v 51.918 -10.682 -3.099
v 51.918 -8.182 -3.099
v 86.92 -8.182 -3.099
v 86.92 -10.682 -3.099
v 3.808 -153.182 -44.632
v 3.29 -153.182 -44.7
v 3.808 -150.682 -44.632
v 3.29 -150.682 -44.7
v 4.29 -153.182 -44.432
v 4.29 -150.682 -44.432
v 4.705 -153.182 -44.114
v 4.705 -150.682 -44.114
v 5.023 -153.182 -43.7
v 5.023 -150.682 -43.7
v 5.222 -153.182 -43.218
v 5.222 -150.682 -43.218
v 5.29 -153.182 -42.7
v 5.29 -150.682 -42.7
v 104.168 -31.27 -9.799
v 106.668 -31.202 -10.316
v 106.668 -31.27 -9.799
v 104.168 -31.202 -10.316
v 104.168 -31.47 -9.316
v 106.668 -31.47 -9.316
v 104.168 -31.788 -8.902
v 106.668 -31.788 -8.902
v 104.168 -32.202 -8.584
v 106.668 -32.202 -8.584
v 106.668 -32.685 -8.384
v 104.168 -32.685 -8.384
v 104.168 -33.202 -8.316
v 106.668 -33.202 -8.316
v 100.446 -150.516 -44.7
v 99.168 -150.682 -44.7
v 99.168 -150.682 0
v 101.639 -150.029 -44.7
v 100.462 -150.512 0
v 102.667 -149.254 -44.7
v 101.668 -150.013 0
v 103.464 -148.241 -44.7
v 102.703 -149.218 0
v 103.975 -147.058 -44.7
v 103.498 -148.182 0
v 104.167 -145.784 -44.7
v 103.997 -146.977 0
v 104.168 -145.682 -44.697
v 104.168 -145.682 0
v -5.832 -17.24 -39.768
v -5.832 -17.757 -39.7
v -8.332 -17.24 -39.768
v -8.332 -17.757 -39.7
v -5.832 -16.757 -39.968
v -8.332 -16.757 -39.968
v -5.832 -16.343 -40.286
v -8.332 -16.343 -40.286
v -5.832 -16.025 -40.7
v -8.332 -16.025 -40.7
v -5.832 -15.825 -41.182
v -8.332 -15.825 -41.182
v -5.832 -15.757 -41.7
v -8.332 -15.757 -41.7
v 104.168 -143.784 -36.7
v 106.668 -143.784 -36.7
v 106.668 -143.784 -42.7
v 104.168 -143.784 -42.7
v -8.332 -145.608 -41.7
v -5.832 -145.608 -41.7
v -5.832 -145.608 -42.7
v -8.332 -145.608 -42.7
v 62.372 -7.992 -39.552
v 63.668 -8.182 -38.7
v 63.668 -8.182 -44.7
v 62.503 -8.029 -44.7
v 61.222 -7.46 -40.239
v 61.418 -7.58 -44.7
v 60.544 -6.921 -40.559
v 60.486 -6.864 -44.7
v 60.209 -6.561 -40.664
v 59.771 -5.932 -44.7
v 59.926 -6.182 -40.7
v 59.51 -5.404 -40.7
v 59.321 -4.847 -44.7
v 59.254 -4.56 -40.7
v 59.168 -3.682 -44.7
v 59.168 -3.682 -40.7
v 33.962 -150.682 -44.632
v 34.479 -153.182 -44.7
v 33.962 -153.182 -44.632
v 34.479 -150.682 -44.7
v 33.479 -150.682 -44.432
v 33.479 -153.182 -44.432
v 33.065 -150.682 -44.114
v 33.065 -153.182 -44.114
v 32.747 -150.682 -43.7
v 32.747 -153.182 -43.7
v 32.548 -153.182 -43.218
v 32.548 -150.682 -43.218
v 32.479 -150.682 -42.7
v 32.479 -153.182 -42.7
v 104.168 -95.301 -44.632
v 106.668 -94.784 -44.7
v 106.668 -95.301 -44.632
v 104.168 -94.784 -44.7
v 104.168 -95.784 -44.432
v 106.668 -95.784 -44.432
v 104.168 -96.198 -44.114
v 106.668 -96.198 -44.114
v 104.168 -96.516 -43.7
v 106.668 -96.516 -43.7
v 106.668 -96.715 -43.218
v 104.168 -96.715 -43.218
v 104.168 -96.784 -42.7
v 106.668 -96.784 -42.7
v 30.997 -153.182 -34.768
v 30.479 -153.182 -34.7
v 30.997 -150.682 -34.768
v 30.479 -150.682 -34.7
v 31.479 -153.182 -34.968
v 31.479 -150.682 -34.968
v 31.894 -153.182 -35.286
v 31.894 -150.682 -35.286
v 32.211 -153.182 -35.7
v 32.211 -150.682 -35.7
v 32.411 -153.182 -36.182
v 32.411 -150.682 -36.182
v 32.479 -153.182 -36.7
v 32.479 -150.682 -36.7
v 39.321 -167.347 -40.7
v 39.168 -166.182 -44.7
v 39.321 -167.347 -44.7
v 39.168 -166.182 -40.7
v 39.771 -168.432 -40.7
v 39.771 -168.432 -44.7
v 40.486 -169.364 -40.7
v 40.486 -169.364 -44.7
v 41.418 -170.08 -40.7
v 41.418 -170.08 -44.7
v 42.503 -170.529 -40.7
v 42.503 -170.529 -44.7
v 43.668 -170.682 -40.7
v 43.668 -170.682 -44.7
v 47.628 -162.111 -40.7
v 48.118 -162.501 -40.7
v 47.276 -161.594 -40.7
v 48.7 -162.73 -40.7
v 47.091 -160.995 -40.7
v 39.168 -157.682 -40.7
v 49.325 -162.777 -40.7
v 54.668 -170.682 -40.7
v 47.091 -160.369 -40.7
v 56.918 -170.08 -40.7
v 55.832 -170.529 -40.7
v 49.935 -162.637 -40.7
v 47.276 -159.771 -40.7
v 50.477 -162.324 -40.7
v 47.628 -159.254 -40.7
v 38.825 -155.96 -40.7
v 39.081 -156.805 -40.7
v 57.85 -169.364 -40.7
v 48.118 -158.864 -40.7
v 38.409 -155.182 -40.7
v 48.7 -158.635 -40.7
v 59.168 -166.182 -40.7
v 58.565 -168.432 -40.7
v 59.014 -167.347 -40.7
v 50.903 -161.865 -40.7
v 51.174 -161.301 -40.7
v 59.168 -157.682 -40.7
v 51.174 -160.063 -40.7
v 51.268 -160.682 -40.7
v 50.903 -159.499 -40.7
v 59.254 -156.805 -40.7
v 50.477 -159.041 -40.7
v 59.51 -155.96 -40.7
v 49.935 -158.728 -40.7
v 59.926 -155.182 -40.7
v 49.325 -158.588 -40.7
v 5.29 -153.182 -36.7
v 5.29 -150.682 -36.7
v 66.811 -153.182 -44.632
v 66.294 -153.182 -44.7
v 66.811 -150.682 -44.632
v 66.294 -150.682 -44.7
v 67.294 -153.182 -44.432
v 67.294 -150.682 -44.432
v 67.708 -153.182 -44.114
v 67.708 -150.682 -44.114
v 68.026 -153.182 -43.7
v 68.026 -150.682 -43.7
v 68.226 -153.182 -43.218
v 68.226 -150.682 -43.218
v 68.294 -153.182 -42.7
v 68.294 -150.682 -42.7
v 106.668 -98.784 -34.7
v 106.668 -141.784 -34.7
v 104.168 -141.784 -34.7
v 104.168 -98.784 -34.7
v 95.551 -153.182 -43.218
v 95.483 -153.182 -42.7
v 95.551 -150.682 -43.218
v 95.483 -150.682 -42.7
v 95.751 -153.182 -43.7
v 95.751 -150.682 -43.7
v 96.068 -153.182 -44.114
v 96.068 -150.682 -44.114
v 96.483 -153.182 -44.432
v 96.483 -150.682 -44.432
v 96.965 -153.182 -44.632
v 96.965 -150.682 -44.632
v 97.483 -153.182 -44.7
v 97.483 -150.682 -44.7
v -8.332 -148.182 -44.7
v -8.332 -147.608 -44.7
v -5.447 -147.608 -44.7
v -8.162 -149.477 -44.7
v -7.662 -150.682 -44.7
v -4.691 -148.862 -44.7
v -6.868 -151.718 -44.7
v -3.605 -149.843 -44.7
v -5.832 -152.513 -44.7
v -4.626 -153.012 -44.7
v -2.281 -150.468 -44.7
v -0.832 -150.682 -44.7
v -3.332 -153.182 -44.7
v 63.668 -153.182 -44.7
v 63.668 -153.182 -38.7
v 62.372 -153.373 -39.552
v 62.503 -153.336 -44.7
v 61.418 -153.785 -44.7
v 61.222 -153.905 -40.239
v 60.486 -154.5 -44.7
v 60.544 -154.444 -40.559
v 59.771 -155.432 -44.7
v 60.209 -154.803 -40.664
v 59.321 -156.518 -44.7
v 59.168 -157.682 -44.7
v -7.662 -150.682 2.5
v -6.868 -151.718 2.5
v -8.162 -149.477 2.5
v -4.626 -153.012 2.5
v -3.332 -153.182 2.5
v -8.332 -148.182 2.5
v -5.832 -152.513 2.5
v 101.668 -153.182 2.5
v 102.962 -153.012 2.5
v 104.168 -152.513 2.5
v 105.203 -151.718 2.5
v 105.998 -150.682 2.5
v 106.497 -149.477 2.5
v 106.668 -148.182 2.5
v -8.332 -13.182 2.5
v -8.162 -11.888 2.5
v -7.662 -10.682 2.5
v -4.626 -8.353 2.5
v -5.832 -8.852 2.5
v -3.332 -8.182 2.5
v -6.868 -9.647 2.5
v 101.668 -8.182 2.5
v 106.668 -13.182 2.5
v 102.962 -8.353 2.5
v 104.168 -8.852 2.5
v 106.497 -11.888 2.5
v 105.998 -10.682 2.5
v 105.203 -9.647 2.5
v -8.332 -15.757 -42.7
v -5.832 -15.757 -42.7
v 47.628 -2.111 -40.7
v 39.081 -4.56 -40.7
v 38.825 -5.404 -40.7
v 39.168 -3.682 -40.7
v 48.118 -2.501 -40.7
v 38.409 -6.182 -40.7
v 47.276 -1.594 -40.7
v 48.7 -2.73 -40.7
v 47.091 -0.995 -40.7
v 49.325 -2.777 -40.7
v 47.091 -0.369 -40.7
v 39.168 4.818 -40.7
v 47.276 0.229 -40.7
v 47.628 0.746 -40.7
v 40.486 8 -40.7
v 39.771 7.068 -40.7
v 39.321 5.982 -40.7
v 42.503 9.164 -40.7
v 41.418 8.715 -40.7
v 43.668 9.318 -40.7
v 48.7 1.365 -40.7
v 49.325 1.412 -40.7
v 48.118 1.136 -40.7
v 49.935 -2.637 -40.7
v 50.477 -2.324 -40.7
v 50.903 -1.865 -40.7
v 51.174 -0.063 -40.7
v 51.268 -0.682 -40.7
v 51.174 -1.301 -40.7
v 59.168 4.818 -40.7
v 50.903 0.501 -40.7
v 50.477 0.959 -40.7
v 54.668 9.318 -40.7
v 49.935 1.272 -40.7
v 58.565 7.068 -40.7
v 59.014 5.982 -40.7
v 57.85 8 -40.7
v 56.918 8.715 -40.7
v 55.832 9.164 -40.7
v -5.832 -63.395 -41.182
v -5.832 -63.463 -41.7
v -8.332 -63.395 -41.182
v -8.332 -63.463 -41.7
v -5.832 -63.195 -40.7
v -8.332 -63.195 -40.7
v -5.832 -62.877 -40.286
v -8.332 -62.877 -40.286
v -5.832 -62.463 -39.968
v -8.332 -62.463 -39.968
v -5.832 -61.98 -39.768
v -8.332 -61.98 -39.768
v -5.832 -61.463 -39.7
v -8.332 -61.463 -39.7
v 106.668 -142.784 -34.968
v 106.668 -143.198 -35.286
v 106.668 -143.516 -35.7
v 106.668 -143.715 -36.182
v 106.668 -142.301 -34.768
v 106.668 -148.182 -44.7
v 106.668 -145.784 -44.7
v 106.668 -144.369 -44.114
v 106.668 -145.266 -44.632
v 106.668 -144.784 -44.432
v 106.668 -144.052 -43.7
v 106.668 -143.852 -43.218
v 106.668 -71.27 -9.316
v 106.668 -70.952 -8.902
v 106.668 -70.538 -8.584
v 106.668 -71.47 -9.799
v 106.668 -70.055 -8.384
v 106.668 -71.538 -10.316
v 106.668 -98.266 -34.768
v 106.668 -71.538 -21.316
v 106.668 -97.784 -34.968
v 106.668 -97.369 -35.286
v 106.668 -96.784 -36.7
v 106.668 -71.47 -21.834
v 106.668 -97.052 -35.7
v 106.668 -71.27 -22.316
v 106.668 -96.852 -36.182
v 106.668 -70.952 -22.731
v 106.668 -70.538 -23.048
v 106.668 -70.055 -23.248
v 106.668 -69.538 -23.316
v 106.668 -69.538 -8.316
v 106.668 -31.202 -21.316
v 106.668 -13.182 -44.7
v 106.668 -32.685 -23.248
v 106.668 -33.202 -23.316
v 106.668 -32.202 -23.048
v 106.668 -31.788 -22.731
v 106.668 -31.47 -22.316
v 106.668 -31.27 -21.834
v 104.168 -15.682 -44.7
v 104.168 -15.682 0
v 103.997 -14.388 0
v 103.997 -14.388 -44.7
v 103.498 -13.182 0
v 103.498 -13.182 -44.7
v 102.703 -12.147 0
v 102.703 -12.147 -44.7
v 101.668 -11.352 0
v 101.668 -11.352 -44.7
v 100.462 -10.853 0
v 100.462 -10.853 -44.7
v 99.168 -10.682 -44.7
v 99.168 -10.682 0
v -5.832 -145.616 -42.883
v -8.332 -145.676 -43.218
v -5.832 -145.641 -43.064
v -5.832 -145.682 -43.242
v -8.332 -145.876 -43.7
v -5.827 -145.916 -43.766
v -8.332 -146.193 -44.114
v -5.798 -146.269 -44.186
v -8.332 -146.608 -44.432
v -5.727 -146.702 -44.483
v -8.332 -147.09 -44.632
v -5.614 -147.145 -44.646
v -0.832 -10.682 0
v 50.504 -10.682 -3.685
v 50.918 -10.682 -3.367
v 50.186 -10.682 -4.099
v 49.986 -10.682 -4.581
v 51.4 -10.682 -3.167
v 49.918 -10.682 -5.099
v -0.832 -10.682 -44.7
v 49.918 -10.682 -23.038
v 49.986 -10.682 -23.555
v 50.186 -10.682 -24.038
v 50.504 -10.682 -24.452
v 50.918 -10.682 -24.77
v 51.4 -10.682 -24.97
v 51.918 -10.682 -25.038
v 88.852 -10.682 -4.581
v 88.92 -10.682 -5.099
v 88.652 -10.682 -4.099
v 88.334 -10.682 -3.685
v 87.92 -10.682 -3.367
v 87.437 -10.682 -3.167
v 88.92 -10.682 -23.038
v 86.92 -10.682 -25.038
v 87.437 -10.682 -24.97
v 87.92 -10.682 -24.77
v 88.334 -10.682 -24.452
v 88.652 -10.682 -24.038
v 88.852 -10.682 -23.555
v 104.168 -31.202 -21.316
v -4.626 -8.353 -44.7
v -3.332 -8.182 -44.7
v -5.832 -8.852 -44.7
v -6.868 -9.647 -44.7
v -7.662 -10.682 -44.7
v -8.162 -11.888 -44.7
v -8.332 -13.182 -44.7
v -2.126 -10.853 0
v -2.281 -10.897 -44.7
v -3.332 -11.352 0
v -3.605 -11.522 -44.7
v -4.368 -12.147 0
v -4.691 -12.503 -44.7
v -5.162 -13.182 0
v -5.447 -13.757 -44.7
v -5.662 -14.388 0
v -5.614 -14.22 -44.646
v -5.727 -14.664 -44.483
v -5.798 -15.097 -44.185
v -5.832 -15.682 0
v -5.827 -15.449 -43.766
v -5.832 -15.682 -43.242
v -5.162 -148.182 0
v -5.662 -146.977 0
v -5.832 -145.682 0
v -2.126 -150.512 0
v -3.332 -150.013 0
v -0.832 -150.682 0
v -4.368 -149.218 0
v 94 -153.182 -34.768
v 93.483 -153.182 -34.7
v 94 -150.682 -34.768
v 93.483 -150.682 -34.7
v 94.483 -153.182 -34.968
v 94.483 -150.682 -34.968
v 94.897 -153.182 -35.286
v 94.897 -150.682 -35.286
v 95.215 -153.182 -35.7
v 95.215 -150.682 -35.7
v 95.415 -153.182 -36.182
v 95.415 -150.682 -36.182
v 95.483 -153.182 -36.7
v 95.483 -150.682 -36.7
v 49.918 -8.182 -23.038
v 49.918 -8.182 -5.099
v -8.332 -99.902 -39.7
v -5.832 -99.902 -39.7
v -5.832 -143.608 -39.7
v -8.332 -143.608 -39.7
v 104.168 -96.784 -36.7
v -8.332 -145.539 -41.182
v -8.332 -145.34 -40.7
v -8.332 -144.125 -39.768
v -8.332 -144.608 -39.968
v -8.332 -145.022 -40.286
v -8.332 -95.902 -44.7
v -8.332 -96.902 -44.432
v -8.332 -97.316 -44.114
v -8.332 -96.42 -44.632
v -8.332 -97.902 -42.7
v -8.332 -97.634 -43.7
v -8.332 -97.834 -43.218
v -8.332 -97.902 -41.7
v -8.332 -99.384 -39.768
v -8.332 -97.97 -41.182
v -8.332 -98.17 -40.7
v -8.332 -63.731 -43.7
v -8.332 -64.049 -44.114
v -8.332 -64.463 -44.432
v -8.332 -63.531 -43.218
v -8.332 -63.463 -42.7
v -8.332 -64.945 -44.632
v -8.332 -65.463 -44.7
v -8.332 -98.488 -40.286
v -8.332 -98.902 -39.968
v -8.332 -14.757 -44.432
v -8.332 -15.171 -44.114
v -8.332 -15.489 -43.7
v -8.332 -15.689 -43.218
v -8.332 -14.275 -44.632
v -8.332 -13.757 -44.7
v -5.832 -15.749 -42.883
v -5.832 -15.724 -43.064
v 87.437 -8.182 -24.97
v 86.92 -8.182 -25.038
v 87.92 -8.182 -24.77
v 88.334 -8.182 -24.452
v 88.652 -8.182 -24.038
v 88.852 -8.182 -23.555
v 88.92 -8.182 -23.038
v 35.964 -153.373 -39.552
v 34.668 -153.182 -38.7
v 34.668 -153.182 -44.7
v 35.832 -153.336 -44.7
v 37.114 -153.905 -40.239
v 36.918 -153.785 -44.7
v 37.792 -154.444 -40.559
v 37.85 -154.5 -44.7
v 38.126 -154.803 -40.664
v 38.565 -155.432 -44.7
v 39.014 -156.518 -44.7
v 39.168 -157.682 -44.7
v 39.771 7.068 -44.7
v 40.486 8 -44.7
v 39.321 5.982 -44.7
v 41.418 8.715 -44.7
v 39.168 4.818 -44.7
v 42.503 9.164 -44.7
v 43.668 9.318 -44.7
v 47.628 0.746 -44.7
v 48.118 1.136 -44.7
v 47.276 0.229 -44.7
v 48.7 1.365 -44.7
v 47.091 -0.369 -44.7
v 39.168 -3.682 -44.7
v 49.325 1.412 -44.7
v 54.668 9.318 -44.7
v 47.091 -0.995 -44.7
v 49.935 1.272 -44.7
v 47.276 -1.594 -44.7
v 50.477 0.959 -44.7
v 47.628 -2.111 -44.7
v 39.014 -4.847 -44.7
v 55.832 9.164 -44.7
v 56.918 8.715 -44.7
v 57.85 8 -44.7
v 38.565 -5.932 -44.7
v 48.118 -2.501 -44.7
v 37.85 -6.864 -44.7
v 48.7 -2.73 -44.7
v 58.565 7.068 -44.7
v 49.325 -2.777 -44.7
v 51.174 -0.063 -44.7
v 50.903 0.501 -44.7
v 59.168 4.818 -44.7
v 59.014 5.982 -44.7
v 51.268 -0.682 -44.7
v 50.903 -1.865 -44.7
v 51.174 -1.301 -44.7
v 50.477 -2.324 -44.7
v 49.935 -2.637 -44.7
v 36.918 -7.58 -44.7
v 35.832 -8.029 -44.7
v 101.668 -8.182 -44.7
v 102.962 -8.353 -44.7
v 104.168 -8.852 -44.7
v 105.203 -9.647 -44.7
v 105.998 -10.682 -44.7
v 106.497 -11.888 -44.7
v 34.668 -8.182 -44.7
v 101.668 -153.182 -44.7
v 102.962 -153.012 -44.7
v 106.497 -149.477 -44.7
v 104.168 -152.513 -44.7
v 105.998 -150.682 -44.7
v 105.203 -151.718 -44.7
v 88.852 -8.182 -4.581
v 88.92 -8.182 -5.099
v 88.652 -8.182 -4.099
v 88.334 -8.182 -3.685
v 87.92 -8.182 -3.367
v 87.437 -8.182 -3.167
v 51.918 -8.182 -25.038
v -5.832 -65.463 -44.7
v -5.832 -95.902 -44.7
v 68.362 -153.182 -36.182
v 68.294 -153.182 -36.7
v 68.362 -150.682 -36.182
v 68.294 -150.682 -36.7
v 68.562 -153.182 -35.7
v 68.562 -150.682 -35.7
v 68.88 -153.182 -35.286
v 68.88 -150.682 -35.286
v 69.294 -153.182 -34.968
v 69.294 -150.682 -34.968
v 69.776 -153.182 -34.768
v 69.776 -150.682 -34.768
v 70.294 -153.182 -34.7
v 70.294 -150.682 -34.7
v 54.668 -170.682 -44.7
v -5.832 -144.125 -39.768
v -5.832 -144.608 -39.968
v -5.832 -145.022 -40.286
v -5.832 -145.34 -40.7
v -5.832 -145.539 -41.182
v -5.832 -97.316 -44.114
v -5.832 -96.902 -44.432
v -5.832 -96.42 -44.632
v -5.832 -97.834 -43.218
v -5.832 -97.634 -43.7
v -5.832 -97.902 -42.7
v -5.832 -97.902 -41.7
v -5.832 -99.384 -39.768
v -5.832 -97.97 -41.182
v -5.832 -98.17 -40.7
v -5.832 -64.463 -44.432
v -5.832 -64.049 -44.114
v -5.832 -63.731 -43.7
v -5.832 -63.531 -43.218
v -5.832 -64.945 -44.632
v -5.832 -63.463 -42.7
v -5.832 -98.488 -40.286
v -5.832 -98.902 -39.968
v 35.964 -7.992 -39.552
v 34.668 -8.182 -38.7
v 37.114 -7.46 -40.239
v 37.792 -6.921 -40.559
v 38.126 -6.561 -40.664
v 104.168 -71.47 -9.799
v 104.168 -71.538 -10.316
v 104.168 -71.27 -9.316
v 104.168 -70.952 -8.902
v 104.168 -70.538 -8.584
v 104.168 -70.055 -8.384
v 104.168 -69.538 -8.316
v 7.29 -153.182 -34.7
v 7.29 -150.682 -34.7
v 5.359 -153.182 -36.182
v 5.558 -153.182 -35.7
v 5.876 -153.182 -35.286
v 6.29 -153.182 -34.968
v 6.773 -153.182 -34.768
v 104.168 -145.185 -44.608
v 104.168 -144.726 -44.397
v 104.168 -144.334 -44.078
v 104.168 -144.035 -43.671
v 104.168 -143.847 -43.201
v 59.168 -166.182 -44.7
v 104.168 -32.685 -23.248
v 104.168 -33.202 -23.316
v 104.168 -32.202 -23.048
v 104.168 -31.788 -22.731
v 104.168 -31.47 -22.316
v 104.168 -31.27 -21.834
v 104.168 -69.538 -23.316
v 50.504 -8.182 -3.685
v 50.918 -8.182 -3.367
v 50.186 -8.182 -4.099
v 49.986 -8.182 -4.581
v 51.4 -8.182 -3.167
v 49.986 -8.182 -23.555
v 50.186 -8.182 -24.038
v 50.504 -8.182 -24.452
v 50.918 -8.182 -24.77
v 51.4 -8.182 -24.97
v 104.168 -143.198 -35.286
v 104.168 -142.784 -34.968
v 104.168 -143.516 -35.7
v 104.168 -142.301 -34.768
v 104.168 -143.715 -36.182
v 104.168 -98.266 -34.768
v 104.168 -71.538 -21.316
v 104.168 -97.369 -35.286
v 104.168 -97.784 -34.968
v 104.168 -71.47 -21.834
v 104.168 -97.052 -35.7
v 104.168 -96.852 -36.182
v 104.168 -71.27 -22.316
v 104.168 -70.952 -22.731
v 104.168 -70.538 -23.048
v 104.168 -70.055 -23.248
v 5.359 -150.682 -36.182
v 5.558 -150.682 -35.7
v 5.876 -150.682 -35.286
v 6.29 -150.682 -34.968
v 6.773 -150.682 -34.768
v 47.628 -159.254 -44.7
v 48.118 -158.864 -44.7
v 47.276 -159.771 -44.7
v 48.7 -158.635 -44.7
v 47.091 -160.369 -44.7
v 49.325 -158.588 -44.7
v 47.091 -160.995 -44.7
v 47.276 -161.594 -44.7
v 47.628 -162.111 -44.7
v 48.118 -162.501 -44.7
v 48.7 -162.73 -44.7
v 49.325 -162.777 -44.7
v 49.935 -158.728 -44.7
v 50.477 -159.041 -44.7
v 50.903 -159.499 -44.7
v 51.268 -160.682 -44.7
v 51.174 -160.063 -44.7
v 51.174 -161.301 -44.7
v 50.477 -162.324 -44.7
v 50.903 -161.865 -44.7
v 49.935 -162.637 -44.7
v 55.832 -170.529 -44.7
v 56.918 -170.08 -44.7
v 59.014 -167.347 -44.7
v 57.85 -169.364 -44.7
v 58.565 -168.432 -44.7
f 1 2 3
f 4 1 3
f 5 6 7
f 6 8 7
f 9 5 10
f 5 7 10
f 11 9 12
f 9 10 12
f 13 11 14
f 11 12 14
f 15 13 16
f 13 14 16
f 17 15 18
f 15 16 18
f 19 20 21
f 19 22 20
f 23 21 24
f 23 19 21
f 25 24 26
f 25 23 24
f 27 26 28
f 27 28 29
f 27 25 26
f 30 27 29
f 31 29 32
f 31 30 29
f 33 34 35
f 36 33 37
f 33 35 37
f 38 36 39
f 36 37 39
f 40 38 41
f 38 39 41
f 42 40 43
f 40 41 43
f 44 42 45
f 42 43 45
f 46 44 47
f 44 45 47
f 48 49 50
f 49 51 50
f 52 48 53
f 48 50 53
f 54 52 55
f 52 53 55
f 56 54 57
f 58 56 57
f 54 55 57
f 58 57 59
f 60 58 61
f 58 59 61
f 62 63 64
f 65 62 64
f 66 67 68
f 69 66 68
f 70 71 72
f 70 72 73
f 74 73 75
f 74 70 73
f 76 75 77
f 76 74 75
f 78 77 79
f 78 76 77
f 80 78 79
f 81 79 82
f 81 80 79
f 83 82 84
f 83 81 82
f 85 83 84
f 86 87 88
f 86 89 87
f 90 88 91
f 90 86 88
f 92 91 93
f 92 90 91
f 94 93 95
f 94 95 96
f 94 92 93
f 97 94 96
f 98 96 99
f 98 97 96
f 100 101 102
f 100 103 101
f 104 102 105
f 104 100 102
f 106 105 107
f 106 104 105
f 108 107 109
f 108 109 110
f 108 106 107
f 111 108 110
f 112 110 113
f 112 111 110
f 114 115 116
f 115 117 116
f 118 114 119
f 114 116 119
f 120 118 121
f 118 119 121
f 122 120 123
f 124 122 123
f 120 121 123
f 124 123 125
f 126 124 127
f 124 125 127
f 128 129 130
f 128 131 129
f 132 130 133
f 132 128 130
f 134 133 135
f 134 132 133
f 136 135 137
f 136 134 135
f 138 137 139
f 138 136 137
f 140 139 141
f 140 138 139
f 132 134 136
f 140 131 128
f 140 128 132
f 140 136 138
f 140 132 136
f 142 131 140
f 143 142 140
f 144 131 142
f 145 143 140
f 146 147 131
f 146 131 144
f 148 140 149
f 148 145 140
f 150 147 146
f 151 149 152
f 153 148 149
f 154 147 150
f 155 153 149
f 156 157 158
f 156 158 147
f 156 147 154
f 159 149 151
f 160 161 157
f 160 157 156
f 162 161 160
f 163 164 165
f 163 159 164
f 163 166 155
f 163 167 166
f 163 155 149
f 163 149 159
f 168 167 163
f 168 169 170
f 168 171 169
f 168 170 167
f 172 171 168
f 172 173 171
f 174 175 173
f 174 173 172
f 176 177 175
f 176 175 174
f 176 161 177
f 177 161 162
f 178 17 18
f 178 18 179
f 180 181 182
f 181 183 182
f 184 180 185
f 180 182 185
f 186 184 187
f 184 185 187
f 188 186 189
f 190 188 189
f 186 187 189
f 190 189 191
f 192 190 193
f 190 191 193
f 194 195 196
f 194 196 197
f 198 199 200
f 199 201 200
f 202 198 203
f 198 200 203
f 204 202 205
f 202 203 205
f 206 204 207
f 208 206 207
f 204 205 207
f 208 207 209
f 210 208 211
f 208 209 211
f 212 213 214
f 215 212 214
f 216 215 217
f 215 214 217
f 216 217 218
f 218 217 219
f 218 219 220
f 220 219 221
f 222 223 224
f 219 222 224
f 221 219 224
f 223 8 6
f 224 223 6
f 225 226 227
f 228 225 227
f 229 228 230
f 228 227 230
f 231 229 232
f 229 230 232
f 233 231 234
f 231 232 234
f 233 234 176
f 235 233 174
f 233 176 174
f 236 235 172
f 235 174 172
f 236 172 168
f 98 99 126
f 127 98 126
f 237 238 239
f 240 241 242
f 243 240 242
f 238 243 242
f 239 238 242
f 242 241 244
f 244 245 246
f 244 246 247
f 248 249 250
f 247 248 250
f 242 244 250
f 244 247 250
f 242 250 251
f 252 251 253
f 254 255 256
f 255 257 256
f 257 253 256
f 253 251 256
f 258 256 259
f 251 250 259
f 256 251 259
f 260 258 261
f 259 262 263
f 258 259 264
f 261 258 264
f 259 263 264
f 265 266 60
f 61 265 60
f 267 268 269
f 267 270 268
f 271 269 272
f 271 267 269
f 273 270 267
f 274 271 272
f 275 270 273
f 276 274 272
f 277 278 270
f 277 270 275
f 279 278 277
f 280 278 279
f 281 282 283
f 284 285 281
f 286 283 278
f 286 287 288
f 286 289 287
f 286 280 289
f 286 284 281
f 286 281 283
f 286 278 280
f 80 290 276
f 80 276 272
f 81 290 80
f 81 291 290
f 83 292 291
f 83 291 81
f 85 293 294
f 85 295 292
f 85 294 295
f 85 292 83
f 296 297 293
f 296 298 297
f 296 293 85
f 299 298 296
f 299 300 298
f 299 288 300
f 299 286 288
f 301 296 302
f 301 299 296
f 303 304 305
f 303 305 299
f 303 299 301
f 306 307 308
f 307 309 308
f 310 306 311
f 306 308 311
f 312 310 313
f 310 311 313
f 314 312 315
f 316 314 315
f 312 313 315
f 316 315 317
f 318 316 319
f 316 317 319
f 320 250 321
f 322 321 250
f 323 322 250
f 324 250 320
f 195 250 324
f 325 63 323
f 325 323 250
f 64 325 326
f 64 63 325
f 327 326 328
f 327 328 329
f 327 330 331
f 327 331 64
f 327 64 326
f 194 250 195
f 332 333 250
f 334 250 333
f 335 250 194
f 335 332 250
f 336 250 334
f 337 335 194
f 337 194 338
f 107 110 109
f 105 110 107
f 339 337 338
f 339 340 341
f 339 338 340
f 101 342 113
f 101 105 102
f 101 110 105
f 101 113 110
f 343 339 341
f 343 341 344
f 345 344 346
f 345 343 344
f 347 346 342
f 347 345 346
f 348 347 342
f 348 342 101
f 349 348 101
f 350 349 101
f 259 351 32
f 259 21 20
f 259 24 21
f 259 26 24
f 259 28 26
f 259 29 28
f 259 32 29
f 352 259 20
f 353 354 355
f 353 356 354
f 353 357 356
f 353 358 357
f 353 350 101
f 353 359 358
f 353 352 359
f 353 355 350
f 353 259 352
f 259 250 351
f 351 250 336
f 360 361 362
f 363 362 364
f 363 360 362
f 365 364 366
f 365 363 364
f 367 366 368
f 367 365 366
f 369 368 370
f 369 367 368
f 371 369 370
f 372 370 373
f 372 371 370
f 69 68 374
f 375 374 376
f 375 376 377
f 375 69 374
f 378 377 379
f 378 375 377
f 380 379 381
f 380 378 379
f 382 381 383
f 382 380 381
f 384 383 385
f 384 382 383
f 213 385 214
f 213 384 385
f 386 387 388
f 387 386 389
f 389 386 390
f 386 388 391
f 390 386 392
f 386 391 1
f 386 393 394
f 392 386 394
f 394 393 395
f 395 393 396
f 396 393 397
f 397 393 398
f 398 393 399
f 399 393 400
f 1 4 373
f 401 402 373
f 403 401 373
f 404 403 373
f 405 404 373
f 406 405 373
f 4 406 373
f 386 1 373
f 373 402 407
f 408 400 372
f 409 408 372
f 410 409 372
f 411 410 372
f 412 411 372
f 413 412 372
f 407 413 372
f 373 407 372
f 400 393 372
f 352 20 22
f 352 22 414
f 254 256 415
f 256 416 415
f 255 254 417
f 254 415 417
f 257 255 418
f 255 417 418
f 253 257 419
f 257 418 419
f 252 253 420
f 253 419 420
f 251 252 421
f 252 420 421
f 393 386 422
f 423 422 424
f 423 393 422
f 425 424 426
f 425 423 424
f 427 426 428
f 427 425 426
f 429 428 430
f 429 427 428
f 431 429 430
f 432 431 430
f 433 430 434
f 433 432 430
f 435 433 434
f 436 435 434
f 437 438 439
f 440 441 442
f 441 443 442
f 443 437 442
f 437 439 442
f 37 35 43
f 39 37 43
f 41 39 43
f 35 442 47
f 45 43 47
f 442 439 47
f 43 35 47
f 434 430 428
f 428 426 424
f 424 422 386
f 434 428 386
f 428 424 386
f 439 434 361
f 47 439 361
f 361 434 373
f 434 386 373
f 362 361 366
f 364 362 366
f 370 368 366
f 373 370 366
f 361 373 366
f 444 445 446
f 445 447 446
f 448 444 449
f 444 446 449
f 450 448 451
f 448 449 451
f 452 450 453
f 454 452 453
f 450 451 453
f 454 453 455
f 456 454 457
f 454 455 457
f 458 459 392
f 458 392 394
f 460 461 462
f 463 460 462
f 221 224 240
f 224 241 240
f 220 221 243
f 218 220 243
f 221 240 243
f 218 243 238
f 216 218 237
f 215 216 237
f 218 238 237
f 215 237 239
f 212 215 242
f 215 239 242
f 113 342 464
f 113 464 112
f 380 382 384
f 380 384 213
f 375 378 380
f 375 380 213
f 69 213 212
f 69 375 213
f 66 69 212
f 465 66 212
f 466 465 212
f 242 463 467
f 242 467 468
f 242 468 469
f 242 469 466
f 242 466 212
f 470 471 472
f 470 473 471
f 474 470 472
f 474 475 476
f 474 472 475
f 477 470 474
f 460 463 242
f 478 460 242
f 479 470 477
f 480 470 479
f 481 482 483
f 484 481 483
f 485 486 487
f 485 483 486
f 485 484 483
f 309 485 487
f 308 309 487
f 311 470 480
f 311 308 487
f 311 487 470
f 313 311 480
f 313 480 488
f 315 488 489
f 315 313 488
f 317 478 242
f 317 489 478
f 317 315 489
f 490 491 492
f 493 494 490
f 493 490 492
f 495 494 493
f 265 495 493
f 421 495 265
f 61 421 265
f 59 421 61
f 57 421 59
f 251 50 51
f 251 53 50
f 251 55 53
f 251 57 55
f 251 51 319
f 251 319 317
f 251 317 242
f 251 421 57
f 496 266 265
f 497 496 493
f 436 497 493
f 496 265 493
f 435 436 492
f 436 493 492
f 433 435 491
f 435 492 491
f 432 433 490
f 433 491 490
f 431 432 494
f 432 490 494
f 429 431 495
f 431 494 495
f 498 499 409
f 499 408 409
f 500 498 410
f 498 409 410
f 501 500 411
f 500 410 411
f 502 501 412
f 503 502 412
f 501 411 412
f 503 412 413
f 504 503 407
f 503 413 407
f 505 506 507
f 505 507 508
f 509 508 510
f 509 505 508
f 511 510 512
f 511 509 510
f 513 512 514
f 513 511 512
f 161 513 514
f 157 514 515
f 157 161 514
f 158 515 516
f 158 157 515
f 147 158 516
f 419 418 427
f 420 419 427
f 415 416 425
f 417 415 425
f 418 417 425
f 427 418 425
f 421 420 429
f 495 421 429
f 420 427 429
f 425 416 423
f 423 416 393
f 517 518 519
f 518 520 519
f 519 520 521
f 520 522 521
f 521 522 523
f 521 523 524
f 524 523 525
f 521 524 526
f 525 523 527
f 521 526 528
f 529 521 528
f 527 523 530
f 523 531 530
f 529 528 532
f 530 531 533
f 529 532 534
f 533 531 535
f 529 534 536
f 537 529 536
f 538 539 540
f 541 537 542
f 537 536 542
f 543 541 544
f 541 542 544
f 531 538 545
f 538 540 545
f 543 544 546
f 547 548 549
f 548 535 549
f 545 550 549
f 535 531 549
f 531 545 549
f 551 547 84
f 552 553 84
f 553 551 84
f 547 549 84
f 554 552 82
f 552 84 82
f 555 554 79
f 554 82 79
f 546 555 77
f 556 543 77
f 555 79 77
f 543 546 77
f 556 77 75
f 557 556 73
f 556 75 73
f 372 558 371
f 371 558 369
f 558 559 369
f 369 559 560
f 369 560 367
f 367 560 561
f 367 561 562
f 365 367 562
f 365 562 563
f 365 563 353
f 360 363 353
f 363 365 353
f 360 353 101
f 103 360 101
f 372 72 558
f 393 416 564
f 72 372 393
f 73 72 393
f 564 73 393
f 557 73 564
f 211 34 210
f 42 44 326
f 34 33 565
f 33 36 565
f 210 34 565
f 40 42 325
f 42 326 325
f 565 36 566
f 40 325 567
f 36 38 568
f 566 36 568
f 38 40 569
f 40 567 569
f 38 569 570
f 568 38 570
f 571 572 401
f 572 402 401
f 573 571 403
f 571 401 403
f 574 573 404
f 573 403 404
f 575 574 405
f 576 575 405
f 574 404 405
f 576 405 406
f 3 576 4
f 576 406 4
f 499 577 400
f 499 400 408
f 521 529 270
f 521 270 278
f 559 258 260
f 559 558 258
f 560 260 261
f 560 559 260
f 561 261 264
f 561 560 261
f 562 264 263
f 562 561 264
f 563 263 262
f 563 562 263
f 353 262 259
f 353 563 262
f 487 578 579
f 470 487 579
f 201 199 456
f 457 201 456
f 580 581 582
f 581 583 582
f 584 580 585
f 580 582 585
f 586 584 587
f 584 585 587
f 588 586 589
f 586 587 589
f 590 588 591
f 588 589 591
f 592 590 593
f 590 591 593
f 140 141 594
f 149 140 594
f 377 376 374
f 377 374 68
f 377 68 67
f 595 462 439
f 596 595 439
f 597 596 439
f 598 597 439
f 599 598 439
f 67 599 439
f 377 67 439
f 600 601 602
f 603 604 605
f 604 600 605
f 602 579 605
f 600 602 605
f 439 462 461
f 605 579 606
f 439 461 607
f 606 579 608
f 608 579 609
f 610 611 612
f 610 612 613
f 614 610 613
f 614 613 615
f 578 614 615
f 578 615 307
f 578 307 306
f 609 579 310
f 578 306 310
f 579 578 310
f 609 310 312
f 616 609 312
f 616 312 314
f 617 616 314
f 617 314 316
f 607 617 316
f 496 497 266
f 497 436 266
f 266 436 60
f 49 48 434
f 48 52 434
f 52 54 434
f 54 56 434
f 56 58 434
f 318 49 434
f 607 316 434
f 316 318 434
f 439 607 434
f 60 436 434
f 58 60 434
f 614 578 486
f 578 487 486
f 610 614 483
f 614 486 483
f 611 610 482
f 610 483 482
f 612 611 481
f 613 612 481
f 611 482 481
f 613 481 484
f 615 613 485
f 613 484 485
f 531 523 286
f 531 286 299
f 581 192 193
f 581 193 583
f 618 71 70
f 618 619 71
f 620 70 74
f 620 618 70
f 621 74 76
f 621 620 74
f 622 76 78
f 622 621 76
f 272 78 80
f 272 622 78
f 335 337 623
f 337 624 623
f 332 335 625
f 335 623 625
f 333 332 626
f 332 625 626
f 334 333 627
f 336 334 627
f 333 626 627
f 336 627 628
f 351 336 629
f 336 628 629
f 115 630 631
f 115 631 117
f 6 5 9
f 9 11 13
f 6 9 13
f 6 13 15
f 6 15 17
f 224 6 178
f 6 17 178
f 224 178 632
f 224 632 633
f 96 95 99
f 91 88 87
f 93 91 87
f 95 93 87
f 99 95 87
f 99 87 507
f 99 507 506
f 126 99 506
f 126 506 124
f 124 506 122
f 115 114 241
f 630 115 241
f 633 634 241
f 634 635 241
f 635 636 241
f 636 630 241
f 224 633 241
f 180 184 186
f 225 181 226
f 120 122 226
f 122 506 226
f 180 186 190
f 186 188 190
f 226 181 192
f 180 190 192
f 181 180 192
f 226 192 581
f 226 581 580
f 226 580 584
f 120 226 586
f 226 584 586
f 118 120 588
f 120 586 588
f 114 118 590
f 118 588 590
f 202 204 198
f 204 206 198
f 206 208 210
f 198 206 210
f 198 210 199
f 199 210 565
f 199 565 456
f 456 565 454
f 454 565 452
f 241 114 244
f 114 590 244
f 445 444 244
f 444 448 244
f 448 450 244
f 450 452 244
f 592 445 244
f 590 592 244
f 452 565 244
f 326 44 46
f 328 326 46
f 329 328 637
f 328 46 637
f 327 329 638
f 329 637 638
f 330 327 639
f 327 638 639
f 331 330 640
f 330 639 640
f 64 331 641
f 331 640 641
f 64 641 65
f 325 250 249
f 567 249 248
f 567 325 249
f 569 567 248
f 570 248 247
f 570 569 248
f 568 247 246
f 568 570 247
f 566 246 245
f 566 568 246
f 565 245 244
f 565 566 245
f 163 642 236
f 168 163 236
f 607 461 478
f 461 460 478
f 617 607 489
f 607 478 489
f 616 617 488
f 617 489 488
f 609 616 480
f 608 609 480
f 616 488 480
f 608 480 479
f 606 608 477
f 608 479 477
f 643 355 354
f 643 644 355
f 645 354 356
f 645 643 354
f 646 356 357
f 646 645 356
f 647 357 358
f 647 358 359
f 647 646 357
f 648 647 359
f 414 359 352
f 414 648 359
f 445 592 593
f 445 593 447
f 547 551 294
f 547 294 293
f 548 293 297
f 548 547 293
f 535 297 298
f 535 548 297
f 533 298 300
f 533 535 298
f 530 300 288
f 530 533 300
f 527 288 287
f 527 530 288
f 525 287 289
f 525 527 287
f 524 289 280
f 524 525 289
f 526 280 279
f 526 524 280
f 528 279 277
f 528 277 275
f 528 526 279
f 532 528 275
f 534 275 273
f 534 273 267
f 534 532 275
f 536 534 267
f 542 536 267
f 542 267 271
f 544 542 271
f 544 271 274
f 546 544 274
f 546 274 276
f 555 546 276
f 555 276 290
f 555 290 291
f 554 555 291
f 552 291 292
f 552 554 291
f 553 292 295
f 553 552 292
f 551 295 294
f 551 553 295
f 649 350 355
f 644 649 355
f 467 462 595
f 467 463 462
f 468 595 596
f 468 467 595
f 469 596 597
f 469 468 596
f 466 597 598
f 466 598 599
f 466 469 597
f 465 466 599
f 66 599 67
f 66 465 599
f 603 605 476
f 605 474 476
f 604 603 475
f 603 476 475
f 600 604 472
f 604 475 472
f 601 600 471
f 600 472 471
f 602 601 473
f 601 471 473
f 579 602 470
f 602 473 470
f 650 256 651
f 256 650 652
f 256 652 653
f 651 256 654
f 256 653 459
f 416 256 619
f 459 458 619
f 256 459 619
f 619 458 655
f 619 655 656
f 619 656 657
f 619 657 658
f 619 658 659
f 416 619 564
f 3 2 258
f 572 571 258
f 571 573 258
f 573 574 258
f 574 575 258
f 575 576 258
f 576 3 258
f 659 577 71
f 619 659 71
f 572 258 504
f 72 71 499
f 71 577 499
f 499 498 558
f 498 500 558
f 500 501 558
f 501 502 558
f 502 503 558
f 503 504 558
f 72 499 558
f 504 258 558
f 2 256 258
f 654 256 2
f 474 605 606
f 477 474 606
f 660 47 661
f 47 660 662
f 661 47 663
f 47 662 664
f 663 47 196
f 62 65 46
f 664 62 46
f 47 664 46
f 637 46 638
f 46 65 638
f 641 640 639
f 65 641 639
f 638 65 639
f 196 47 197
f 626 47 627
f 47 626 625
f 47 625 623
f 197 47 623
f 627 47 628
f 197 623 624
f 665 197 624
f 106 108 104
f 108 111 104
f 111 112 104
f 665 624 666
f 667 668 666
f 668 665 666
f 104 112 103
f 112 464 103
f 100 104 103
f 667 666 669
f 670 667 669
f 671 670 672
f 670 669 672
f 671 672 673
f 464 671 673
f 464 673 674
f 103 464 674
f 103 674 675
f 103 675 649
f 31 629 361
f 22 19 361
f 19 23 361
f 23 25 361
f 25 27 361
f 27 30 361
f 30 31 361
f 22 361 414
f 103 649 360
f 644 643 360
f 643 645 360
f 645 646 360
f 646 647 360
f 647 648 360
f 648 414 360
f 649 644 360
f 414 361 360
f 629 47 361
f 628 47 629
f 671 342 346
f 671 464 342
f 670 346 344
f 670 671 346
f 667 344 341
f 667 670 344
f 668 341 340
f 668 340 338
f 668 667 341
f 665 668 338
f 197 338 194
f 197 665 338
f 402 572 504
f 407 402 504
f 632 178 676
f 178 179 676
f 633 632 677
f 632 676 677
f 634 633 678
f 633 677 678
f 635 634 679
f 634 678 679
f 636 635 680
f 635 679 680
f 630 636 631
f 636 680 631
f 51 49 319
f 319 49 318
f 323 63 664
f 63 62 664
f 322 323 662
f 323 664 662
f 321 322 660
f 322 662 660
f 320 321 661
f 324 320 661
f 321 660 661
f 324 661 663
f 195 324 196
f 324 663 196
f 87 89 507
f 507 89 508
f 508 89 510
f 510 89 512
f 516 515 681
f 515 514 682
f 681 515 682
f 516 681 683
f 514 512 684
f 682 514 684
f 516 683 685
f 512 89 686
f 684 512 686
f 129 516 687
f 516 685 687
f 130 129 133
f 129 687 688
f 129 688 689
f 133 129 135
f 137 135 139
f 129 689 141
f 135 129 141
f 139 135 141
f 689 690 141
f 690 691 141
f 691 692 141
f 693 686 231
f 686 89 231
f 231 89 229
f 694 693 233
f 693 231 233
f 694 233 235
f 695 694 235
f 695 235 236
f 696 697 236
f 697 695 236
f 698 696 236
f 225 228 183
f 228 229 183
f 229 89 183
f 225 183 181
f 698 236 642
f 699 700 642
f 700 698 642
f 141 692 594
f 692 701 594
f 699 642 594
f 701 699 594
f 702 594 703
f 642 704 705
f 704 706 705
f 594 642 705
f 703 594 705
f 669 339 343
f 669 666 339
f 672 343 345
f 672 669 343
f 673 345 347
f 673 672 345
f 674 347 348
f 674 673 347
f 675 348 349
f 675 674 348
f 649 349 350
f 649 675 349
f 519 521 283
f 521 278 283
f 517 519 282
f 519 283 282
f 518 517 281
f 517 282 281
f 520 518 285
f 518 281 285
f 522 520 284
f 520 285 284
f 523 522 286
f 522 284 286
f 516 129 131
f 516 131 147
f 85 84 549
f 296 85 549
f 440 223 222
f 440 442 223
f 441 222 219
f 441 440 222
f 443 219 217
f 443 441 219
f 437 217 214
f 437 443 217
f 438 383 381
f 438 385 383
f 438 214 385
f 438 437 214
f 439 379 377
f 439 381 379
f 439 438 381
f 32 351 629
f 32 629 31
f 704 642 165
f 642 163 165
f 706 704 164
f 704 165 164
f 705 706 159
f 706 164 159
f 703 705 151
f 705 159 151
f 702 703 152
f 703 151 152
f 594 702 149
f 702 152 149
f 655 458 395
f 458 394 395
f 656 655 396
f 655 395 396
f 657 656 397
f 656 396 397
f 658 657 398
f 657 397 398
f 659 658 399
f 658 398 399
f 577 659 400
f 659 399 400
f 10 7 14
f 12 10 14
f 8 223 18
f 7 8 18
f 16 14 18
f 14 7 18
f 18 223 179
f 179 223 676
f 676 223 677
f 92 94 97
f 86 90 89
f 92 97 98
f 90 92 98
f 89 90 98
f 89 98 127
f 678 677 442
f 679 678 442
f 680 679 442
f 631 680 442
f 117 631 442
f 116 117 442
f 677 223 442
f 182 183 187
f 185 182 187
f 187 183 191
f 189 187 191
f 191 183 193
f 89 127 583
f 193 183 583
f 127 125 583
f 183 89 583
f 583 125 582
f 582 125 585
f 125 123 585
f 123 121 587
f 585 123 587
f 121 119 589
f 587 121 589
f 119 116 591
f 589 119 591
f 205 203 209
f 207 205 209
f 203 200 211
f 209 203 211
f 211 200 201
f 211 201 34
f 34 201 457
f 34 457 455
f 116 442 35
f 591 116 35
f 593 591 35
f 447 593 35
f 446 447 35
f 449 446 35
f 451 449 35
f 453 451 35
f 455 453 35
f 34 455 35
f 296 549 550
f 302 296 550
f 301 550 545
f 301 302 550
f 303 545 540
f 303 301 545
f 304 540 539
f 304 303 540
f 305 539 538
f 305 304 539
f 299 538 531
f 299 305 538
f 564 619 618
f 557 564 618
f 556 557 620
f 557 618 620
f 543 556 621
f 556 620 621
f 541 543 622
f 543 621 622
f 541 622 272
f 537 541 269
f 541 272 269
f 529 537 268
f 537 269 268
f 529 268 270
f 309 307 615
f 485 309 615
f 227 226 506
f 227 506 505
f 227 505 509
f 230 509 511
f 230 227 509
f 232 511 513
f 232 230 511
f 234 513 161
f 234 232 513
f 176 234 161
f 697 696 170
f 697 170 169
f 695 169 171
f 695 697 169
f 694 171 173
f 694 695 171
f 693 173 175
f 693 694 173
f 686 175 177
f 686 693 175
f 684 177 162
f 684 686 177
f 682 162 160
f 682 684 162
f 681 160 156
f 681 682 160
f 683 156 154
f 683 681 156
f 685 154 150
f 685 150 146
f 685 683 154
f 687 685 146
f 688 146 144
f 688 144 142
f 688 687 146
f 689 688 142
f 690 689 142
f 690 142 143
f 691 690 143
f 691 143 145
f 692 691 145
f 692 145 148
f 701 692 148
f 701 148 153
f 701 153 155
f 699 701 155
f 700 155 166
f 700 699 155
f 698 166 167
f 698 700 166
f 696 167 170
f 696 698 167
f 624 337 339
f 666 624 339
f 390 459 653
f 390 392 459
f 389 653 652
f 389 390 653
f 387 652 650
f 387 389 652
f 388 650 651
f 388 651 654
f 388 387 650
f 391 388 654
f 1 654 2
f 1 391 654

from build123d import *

# Parameters (mm, degrees)
SKETCH1_W           = 110
SKETCH1_H           = 140
BOSS_EXTRUDE2_DEPTH = 2.5
SKETCH2_W           = 110
SKETCH2_H           = 47.2
BOSS_EXTRUDE3_DEPTH = 2.5
SKETCH3_W           = 110
SKETCH3_H           = 47.2
BOSS_EXTRUDE4_DEPTH = 2.5
SKETCH4_W           = 47.2
SKETCH4_H           = 145
BOSS_EXTRUDE5_DEPTH = 2.5
BOSS_EXTRUDE6_DEPTH = 2.5
FILLET1_R           = 5
SKETCH8_W           = 20
SKETCH8_H           = 17.5
SKETCH8_R           = 2.1
BOSS_EXTRUDE7_DEPTH = 4
FILLET2_R           = 4.5
FILLET3_R           = 2
FILLET4_R           = 2
SKETCH10_W          = 27.188928792
SKETCH10_H          = 10
CUT_EXTRUDE1_DEPTH  = 2.5
SKETCH11_W          = 30.376596305
SKETCH11_H          = 16.688376982
BOSS_EXTRUDE8_DEPTH = 2.5
SKETCH13_W          = 10
SKETCH13_H          = 47
SKETCH13_W_2        = 15
SKETCH13_H_2        = 40.335597964
CUT_EXTRUDE2_DEPTH  = 2.5
SKETCH14_W          = 39.002049577
SKETCH14_H          = 21.938652887
CUT_EXTRUDE3_DEPTH  = 2.5
FILLET5_R           = 2


with BuildPart() as part:
    # Sketch1 → Boss-Extrude2 (new body)
    with BuildSketch(Plane.XY):
        with Locations((49.167763787, -80.682426657)):
            Rectangle(SKETCH1_W, SKETCH1_H)
    extrude(amount=BOSS_EXTRUDE2_DEPTH)

    # Sketch2 → Boss-Extrude3 (add)
    with BuildSketch(Plane.XZ.offset(150.682426657)):
        with Locations((49.167763787, -21.1)):
            Rectangle(SKETCH2_W, SKETCH2_H)
    extrude(amount=BOSS_EXTRUDE3_DEPTH)

    # Sketch3 → Boss-Extrude4 (add)
    with BuildSketch(Plane(origin=(0, -10.682426657, 0), x_dir=(1, 0, 0), z_dir=(0, 1, 0))):
        with Locations((49.167763787, 21.1)):
            Rectangle(SKETCH3_W, SKETCH3_H)
    extrude(amount=BOSS_EXTRUDE4_DEPTH)

    # Sketch4 → Boss-Extrude5 (add)
    with BuildSketch(Plane(origin=(104.167763787, 0, 0), x_dir=(0, 0, -1), z_dir=(1, 0, 0))):
        with Locations((21.1, -80.682426657)):
            Rectangle(SKETCH4_W, SKETCH4_H)
    extrude(amount=BOSS_EXTRUDE5_DEPTH)

    # Sketch7 → Boss-Extrude6 (add)
    with BuildSketch(Plane.ZY.offset(5.832236213)):
        Polygon((2.5, -8.182426657), (-44.7, -8.182426657), (-44.7, -15.757207328), (-39.7, -15.757207328), (-39.7, -63.462848096), (-44.7, -63.462848096), (-44.7, -97.902005218), (-39.7, -97.902005218), (-39.7, -145.607645986), (-44.7, -145.607645986), (-44.7, -153.182426657), (2.5, -153.182426657), align=None)
    extrude(amount=BOSS_EXTRUDE6_DEPTH)

    # Fillet1
    fillet1_edges = [part.edges().sort_by_distance(p)[0] for p in [
        (-5.832236213, -150.682426657, -22.35),
        (104.167763787, -150.682426657, -22.35),
        (104.167763787, -10.682426657, -22.35),
        (-5.832236213, -10.682426657, -22.35),
        (106.667763787, -153.182426657, -21.1),
        (106.667763787, -8.182426657, -21.1),
        (-8.332236213, -8.182426657, -21.1),
        (-8.332236213, -153.182426657, -21.1),
    ]]
    fillet(fillet1_edges, radius=FILLET1_R)

    # Sketch8 → Boss-Extrude7 (add)
    # profile 1 of 2: a face of its own
    with BuildSketch(Plane.XY.offset(-44.7)):
        with Locations((49.167763787, 0.567573343)):
            Rectangle(SKETCH8_W, SKETCH8_H)
        with Locations((49.167763787, -0.682426657)):
            Circle(SKETCH8_R, mode=Mode.SUBTRACT)
    # profile 2 of 2: a face of its own
    with BuildSketch(Plane.XY.offset(-44.7)):
        with Locations((49.167763787, -161.932426657)):
            Rectangle(SKETCH8_W, SKETCH8_H)
        with Locations((49.167763787, -160.682426657)):
            Circle(SKETCH8_R, mode=Mode.SUBTRACT)
    extrude(amount=BOSS_EXTRUDE7_DEPTH)

    # Fillet2
    fillet2_edges = [part.edges().sort_by_distance(p)[0] for p in [
        (39.167763787, -8.182426657, -42.7),
        (59.167763787, -8.182426657, -42.7),
        (59.167763787, 9.317573343, -42.7),
        (39.167763787, 9.317573343, -42.7),
        (39.167763787, -170.682426657, -42.7),
        (59.167763787, -170.682426657, -42.7),
        (59.167763787, -153.182426657, -42.7),
        (39.167763787, -153.182426657, -42.7),
    ]]
    fillet(fillet2_edges, radius=FILLET2_R)

    # Fillet3
    fillet3_edges = [part.edges().sort_by_distance(p)[0] for p in [
        (-7.082236213, -15.757207328, -44.7),
        (-7.082236213, -15.757207328, -39.7),
        (-7.082236213, -63.462848096, -39.7),
        (-7.082236213, -63.462848096, -44.7),
        (-7.082236213, -97.902005218, -44.7),
        (-7.082236213, -97.902005218, -39.7),
        (-7.082236213, -145.607645986, -39.7),
        (-7.082236213, -145.607645986, -44.7),
    ]]
    fillet(fillet3_edges, radius=FILLET3_R)

    # Fillet4
    fillet4_edges = [part.edges().sort_by_distance(p)[0] for p in [
        (49.167763787, -8.182426657, -40.7),
        (49.167763787, -153.182426657, -40.7),
    ]]
    fillet(fillet4_edges, radius=FILLET4_R)

    # Sketch10 → Cut-Extrude1 (cut)
    with BuildSketch(Plane.XZ.offset(153.182426657)):
        with Locations((18.884922409, -39.7)):
            Rectangle(SKETCH10_W, SKETCH10_H)
        with Locations((81.888233264, -39.7)):
            Rectangle(SKETCH10_W, SKETCH10_H)
    extrude(amount=-CUT_EXTRUDE1_DEPTH, mode=Mode.SUBTRACT)

    # Sketch11 → Boss-Extrude8 (add)
    with BuildSketch(Plane(origin=(0, -8.182426657, 0), x_dir=(1, 0, 0), z_dir=(0, 1, 0))):
        with Locations((74.481594042, 13.130831216)):
            Rectangle(SKETCH11_W, SKETCH11_H)
    extrude(amount=-BOSS_EXTRUDE8_DEPTH)

    # Sketch13 → Cut-Extrude2 (cut)
    with BuildSketch(Plane(origin=(106.667763787, 0, 0), x_dir=(0, 0, -1), z_dir=(1, 0, 0))):
        with Locations((39.7, -120.28356874)):
            Rectangle(SKETCH13_W, SKETCH13_H)
        with Locations((15.816287793, -51.369975871)):
            Rectangle(SKETCH13_W_2, SKETCH13_H_2)
    extrude(amount=-CUT_EXTRUDE2_DEPTH, mode=Mode.SUBTRACT)

    # Sketch14 → Cut-Extrude3 (cut)
    with BuildSketch(Plane(origin=(0, -8.182426657, 0), x_dir=(1, 0, 0), z_dir=(0, 1, 0))):
        with Locations((69.418827991, 14.068380485)):
            Rectangle(SKETCH14_W, SKETCH14_H)
    extrude(amount=-CUT_EXTRUDE3_DEPTH, mode=Mode.SUBTRACT)

    # Fillet5
    fillet5_edges = [part.edges().sort_by_distance(p)[0] for p in [
        (5.290458013, -151.932426657, -44.7),
        (5.290458013, -151.932426657, -34.7),
        (32.479386805, -151.932426657, -34.7),
        (32.479386805, -151.932426657, -44.7),
        (68.293768868, -151.932426657, -44.7),
        (68.293768868, -151.932426657, -34.7),
        (95.48269766, -151.932426657, -34.7),
        (95.48269766, -151.932426657, -44.7),
        (105.417763787, -143.78356874, -34.7),
        (105.417763787, -96.78356874, -34.7),
        (105.417763787, -96.78356874, -44.7),
        (105.417763787, -143.78356874, -44.7),
        (105.417763787, -71.537774853, -8.316287793),
        (105.417763787, -31.202176889, -8.316287793),
        (105.417763787, -31.202176889, -23.316287793),
        (105.417763787, -71.537774853, -23.316287793),
        (88.919852779, -9.432426657, -25.037706928),
        (88.919852779, -9.432426657, -3.099054041),
        (49.917803202, -9.432426657, -3.099054041),
        (49.917803202, -9.432426657, -25.037706928),
    ]]
    fillet(fillet5_edges, radius=FILLET5_R)


solid = part.part
